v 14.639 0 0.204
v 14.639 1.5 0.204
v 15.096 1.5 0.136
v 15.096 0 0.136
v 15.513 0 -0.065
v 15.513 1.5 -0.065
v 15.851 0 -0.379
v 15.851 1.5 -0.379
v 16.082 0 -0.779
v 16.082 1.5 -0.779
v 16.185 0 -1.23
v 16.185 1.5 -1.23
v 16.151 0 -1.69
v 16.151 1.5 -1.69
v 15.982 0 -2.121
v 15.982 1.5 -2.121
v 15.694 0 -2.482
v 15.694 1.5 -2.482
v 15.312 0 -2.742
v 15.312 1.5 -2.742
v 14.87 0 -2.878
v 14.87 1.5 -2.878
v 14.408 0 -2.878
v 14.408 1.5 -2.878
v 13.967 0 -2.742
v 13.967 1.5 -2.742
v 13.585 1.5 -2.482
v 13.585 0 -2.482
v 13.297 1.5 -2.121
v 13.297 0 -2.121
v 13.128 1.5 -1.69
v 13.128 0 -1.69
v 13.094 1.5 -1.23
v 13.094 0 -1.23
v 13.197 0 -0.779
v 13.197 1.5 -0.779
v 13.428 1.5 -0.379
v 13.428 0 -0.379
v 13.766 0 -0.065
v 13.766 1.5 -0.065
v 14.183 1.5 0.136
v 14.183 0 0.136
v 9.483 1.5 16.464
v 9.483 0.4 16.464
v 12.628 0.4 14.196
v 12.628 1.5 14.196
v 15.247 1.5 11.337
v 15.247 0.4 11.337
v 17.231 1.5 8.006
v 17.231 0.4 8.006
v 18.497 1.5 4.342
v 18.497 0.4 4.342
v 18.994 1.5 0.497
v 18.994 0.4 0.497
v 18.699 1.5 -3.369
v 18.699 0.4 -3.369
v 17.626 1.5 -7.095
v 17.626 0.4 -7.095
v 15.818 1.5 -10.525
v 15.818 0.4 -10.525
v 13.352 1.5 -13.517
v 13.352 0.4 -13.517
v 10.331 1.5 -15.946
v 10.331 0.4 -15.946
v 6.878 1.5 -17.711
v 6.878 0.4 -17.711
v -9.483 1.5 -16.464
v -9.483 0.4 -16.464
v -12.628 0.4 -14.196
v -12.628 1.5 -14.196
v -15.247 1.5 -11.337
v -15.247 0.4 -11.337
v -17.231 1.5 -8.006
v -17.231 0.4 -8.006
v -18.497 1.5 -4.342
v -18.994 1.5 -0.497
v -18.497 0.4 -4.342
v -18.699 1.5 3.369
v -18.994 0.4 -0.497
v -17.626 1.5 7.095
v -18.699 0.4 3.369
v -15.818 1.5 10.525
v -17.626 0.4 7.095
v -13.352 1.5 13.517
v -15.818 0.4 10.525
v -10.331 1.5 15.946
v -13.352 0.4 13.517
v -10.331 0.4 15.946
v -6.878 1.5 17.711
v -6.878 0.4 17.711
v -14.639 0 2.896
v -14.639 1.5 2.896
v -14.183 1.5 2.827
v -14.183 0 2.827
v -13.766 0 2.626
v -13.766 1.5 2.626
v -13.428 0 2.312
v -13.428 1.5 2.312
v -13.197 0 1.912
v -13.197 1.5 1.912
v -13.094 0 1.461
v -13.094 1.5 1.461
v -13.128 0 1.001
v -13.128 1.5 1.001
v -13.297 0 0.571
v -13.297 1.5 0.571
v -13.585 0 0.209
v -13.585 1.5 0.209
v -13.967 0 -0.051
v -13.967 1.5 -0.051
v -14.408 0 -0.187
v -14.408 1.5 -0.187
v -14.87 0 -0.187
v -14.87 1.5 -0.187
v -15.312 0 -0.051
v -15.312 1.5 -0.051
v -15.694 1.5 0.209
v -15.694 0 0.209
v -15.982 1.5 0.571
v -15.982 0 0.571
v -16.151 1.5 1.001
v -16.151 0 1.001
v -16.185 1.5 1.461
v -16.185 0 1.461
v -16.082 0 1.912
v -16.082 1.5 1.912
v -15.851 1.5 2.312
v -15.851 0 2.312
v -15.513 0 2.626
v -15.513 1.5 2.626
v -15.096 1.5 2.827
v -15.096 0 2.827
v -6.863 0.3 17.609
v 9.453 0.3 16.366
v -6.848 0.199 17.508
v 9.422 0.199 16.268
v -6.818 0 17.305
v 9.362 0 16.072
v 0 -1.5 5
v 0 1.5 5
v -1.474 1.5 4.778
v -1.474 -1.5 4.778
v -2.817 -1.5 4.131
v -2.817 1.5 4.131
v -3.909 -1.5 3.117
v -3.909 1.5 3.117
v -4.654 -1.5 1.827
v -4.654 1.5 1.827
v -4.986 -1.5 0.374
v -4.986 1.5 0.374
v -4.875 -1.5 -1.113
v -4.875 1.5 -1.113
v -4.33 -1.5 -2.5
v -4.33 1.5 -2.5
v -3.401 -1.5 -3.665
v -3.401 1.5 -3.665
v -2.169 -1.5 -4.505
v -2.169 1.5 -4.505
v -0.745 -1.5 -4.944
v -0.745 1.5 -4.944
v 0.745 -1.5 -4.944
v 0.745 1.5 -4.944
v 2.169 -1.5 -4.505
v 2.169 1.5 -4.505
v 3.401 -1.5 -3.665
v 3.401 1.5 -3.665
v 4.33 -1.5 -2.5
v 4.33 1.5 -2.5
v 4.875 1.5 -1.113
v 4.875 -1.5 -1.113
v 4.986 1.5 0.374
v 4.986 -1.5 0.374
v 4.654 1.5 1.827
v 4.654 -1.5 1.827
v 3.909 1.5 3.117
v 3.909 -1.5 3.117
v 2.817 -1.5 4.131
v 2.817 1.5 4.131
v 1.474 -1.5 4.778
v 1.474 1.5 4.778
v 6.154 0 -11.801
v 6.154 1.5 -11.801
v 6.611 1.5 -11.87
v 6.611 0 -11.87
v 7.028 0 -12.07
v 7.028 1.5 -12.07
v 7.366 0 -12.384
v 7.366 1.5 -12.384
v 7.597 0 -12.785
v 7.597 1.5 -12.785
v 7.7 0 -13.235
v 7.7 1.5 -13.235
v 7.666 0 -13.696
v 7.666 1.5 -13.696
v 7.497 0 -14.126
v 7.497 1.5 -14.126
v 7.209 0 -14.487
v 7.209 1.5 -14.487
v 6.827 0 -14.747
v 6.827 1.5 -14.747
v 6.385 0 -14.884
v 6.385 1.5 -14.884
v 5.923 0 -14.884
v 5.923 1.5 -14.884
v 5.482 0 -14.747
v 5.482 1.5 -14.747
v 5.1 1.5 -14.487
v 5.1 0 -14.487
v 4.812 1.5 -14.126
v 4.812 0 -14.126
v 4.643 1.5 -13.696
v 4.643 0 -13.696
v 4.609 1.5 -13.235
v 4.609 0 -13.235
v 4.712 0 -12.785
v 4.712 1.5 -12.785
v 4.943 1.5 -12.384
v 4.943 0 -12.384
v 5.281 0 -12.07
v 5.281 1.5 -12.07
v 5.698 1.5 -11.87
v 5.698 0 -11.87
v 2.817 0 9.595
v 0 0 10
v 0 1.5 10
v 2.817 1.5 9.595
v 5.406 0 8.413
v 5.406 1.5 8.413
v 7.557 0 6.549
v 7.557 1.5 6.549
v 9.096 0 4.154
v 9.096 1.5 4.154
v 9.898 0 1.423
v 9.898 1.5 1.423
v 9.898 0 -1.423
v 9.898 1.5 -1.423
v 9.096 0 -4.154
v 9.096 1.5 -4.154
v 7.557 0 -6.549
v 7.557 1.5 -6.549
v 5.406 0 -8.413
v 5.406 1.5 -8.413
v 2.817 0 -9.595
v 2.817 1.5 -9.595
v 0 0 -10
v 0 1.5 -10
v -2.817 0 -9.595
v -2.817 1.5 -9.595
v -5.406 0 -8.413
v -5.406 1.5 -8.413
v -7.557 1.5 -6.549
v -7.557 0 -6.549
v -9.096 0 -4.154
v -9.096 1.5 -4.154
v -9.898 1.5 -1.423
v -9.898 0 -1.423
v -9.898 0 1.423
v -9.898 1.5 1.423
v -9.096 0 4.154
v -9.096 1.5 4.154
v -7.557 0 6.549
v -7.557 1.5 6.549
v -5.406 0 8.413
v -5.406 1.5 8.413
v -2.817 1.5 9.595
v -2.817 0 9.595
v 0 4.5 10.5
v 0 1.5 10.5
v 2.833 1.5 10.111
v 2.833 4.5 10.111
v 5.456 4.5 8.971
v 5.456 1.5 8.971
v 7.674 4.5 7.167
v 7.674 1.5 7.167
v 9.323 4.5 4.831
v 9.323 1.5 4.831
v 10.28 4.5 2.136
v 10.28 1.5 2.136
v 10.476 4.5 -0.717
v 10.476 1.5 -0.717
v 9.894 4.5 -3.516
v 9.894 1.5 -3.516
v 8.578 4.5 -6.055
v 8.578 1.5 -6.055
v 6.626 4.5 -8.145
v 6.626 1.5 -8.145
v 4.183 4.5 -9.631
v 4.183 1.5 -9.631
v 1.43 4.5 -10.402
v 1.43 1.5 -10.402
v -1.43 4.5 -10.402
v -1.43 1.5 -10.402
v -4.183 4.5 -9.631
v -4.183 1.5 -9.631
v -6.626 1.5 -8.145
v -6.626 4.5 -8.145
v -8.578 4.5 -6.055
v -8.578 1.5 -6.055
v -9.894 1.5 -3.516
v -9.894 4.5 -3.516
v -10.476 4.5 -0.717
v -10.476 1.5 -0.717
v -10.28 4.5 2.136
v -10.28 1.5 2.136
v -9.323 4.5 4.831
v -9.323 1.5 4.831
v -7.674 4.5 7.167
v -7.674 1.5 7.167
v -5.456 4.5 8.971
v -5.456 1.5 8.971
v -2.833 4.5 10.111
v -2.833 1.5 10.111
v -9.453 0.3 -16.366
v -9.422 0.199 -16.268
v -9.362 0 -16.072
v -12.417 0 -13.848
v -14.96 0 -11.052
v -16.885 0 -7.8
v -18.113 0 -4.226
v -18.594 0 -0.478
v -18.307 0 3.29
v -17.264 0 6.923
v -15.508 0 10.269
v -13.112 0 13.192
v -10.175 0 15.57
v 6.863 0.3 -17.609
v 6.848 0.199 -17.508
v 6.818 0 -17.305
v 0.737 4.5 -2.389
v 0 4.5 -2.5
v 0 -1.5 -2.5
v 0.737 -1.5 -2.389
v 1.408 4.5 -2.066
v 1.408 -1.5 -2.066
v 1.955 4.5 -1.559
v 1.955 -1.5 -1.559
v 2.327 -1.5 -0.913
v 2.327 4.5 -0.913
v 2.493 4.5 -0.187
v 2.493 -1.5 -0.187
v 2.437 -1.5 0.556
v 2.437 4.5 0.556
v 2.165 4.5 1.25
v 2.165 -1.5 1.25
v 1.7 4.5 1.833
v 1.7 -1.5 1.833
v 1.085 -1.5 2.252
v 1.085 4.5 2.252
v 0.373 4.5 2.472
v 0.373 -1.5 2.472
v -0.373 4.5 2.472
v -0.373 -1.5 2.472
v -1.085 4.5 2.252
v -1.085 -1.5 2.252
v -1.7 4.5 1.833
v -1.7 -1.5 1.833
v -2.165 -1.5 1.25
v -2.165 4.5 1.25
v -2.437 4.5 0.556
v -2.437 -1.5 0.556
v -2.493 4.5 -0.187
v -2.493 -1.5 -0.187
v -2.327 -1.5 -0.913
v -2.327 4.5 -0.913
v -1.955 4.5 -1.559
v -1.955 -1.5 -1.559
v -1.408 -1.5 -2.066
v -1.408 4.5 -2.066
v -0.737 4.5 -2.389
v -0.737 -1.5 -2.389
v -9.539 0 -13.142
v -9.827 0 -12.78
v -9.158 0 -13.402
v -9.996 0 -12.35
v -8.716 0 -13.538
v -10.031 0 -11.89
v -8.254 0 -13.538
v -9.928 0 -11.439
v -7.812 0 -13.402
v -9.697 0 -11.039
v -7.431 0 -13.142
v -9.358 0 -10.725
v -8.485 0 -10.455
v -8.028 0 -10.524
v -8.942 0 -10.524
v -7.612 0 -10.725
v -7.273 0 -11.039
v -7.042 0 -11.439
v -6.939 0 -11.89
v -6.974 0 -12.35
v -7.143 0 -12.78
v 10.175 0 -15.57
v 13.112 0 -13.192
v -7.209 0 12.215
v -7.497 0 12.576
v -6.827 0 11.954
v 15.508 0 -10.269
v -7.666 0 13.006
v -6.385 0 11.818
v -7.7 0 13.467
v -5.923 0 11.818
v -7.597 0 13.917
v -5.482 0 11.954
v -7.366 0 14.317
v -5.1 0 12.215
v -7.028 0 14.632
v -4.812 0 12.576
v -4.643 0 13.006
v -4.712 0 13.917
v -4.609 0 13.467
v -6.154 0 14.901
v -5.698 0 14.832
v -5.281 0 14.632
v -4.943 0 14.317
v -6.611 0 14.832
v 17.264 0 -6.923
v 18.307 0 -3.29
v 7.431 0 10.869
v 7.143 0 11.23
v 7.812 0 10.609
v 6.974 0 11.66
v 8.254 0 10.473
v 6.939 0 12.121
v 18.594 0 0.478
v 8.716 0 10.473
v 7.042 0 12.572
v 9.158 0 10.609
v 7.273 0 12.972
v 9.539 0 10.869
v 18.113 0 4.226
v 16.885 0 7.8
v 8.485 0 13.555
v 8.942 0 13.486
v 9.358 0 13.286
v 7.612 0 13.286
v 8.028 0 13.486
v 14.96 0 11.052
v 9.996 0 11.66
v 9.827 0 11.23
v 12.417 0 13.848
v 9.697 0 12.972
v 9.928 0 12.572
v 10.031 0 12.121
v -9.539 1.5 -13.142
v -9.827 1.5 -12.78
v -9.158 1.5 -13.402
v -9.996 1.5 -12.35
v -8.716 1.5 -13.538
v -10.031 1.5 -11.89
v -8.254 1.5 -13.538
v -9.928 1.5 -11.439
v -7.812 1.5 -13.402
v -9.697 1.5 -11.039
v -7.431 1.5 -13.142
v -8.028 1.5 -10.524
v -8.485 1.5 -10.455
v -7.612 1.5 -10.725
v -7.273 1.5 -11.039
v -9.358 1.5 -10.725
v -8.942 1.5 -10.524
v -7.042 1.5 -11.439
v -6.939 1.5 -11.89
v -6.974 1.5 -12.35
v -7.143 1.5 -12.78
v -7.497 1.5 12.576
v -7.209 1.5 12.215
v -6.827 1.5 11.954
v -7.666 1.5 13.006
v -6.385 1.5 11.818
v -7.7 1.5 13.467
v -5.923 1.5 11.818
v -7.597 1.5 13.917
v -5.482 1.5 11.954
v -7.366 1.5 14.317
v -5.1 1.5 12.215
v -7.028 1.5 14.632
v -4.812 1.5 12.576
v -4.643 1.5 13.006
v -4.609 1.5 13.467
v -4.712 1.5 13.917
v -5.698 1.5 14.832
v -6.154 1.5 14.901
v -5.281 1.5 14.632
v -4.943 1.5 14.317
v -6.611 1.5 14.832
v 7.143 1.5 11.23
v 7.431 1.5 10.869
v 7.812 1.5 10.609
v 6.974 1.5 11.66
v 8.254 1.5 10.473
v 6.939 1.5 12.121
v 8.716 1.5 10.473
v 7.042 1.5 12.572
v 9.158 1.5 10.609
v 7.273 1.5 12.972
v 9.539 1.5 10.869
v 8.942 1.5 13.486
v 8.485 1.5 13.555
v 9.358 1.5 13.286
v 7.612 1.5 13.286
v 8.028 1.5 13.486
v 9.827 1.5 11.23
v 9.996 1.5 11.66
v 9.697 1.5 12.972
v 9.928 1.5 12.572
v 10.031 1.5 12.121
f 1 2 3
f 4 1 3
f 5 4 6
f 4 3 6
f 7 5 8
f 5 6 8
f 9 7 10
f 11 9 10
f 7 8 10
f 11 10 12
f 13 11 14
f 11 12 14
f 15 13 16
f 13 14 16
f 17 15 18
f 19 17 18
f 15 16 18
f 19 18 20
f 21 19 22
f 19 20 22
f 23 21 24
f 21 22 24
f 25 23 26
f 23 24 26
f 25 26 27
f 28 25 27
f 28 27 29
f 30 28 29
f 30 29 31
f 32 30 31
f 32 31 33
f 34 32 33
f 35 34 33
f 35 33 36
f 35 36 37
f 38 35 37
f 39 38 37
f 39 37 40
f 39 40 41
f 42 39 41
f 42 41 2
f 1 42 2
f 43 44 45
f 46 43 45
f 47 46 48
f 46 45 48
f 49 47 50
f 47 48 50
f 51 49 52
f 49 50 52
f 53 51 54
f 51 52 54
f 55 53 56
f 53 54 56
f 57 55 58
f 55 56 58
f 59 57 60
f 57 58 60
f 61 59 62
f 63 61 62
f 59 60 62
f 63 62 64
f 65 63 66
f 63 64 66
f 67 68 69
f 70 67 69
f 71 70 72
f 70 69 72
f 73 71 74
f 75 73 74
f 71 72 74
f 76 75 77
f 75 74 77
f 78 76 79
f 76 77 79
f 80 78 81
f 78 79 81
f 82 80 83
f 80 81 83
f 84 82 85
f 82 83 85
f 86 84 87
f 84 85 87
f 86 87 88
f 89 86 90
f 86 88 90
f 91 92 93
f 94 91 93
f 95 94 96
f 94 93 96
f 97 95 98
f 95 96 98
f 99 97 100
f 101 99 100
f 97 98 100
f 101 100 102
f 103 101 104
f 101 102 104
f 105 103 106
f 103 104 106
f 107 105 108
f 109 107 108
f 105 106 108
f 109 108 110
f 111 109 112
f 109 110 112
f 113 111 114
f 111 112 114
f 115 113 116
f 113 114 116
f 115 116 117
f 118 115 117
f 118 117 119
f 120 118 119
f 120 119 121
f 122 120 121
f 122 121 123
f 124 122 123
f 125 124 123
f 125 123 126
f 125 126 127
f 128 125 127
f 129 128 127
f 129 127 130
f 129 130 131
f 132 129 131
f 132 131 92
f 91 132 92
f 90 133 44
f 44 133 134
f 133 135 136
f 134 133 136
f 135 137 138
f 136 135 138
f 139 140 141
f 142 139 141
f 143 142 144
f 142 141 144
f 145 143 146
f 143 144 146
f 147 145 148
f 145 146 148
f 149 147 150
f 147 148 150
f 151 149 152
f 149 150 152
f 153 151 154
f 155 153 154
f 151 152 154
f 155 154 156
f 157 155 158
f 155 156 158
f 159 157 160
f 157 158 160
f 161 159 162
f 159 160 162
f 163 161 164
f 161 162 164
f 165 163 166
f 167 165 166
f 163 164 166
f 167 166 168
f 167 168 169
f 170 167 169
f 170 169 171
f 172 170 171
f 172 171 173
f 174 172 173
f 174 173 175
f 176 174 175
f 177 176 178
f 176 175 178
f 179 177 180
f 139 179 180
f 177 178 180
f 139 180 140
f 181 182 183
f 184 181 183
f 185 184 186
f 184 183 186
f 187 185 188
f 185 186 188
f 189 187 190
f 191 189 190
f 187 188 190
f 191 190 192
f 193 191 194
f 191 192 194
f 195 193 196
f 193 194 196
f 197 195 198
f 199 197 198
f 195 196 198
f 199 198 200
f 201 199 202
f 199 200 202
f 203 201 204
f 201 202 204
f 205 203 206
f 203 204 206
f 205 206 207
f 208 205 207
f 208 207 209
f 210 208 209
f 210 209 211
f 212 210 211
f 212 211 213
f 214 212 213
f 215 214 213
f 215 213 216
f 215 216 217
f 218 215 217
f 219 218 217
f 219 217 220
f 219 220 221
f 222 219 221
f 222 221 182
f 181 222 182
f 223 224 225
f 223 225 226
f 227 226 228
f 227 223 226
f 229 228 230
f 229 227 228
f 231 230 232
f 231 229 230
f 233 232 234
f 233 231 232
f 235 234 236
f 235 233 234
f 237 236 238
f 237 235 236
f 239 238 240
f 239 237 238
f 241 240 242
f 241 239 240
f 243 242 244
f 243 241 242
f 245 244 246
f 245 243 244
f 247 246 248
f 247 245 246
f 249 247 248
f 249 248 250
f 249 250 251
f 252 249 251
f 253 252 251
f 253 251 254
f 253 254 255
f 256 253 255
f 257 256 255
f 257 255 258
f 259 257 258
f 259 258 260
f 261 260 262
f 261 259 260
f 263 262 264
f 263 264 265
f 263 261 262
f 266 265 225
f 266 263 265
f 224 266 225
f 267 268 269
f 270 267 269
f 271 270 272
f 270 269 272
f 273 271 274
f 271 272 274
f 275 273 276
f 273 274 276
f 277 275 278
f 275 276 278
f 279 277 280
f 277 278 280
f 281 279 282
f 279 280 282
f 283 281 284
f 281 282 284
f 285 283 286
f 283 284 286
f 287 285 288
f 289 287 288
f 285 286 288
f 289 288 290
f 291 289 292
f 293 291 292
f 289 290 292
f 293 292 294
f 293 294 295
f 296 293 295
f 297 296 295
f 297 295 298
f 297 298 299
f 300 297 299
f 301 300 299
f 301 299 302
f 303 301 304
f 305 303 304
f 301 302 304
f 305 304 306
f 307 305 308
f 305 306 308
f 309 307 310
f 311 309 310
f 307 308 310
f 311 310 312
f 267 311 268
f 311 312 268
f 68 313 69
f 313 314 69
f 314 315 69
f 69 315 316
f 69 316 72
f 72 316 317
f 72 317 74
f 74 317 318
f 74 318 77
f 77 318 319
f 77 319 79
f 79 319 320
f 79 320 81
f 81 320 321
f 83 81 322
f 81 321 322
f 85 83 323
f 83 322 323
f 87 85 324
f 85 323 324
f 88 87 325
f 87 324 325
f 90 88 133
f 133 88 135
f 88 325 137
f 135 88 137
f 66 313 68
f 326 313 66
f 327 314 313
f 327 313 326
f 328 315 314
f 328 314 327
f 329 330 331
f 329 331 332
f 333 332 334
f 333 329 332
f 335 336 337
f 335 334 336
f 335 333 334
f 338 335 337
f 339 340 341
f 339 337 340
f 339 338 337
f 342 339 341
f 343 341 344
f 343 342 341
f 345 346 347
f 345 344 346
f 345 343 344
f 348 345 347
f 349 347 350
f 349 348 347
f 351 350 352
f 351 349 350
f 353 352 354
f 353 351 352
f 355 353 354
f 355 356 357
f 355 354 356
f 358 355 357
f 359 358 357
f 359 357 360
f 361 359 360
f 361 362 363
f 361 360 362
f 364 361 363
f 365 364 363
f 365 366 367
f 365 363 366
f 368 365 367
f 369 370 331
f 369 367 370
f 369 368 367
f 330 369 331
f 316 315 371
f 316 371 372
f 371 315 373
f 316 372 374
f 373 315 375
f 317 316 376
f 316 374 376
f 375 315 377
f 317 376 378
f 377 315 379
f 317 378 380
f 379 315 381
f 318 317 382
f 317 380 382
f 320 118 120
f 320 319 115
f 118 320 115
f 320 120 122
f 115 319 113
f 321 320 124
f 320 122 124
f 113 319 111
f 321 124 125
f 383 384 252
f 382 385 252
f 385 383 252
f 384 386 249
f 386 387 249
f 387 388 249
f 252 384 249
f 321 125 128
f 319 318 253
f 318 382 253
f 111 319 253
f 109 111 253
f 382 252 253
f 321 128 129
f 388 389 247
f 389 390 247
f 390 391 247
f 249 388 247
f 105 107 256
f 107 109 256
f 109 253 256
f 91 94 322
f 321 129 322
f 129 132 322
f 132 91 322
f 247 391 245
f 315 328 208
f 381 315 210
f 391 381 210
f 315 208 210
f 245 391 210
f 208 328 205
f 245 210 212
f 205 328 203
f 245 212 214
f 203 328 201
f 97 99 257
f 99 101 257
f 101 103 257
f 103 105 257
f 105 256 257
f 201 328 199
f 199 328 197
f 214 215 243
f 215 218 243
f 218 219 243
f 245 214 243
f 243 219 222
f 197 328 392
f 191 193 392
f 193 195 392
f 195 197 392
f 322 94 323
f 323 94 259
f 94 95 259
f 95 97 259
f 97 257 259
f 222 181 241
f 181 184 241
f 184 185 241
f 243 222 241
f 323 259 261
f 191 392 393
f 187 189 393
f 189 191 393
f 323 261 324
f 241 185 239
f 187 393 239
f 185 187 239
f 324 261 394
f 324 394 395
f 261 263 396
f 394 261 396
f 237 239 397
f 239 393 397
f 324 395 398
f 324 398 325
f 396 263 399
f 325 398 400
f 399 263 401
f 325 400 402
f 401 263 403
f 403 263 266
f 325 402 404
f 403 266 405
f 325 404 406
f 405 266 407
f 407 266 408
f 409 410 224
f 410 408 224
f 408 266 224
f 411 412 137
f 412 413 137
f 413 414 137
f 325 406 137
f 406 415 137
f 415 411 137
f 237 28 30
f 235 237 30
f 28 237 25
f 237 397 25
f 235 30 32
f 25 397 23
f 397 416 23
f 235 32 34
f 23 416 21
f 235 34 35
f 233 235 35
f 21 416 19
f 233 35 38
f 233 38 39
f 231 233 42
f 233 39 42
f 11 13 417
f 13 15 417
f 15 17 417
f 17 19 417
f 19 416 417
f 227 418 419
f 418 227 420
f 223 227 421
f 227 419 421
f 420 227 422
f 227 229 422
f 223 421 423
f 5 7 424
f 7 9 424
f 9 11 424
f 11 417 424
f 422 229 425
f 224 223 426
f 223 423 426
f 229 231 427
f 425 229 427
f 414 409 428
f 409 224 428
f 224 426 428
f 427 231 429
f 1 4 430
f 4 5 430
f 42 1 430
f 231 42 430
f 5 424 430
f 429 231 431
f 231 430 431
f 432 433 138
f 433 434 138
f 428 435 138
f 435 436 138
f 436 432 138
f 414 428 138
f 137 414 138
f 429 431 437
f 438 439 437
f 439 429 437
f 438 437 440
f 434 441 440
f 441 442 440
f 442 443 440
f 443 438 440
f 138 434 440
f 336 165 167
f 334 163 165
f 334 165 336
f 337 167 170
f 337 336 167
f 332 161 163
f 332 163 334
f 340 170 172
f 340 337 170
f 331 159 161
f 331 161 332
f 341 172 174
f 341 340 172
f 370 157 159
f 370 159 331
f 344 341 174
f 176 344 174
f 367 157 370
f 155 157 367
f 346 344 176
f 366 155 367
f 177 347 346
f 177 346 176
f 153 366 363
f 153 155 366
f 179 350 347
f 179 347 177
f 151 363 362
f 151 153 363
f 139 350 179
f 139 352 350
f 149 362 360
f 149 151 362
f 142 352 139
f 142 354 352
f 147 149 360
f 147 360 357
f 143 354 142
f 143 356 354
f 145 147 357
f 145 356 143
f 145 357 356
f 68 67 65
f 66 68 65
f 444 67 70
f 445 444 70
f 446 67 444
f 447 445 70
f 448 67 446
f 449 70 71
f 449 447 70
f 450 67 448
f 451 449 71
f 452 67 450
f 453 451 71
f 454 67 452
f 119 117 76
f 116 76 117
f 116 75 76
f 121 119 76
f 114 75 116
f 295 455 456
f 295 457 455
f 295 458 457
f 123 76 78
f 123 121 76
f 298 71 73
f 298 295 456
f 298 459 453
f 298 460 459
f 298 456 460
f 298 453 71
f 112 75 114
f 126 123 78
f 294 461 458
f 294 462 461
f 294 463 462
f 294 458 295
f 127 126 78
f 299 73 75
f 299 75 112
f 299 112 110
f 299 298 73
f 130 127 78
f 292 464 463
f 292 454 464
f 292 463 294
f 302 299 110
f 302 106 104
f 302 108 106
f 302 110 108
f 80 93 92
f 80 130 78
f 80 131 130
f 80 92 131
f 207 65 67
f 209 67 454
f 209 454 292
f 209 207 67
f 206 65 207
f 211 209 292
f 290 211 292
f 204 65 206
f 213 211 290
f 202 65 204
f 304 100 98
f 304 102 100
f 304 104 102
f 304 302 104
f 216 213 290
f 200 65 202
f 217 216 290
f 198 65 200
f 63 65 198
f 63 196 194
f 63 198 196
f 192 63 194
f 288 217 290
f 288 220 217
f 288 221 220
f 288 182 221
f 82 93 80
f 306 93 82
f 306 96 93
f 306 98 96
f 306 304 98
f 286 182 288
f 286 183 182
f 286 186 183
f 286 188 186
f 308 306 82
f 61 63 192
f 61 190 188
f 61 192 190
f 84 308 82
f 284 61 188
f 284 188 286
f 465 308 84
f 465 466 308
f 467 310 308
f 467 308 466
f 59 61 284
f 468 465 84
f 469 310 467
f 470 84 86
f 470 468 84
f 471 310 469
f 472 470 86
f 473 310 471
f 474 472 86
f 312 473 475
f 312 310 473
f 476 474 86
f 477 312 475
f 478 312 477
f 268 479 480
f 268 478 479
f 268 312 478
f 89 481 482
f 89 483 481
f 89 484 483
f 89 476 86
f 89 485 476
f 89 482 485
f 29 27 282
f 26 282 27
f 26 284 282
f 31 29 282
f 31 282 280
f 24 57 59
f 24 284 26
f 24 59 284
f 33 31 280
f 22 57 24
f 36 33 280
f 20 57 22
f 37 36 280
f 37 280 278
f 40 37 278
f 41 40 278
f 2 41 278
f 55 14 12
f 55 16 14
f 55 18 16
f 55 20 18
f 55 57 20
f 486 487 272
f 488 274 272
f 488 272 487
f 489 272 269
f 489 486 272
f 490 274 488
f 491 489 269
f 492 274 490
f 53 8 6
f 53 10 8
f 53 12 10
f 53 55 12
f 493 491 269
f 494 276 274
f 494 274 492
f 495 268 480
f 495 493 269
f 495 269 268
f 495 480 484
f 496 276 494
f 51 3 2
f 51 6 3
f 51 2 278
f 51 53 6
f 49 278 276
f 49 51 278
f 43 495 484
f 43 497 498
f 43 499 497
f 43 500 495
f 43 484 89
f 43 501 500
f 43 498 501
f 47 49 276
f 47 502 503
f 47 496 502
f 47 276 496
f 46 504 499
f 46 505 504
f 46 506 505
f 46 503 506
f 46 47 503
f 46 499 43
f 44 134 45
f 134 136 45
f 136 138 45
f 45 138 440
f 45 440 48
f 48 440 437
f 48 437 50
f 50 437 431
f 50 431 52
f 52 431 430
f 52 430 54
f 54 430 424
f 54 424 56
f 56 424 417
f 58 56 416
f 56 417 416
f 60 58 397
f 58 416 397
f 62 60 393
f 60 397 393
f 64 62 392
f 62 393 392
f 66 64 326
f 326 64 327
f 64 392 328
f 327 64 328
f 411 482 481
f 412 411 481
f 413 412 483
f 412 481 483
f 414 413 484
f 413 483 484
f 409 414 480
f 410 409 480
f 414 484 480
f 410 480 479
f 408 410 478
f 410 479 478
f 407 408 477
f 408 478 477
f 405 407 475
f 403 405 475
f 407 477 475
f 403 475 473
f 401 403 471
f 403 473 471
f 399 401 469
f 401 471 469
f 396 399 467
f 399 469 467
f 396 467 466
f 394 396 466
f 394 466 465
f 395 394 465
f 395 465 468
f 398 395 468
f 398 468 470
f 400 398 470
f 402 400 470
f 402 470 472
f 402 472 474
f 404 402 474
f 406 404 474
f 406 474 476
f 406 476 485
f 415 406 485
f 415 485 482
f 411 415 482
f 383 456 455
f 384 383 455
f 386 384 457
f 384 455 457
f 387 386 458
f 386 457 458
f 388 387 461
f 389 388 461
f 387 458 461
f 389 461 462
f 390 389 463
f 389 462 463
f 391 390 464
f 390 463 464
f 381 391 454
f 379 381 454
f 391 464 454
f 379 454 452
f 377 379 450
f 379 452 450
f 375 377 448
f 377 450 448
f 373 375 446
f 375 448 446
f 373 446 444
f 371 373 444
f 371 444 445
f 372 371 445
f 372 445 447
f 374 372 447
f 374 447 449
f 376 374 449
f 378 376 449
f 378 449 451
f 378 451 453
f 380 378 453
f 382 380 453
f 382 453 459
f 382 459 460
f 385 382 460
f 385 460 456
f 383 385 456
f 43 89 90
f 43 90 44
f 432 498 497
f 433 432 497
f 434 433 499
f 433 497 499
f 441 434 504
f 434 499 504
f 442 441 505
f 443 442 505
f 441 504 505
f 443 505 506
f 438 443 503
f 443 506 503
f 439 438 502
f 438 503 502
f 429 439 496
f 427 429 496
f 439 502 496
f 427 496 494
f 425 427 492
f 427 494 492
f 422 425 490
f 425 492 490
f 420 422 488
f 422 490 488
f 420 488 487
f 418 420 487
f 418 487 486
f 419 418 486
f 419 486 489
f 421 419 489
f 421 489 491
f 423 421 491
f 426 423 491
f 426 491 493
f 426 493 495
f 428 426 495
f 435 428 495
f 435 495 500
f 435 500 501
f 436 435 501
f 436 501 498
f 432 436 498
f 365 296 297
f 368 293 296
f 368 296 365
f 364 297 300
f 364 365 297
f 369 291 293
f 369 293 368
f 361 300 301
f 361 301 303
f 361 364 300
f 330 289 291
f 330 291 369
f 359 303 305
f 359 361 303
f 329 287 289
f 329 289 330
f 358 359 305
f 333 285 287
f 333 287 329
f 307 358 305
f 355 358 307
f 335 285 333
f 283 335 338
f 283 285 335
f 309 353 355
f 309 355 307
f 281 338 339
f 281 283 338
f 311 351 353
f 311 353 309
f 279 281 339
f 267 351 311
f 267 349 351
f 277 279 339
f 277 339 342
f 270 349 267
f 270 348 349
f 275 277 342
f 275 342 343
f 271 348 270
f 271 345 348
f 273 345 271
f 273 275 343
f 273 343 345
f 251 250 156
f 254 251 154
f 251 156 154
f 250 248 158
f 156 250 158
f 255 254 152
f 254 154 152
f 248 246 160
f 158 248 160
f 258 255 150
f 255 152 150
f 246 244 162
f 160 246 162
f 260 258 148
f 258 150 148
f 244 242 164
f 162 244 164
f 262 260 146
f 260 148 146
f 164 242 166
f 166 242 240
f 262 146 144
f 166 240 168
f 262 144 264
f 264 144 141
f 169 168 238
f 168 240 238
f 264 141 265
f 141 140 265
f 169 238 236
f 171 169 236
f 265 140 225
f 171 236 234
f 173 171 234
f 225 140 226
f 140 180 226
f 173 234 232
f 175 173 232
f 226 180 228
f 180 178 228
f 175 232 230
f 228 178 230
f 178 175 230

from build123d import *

# Parameters (mm, degrees)
SKETCH1_R               = 19
SKETCH1_R_2             = 10
BOSS_EXTRUDE1_DEPTH     = 1.5
SKETCH2_R               = 1.55
CUT_EXTRUDE1_DEPTH      = 27.911893282
SKETCH3_R               = 10.5
BOSS_EXTRUDE2_DEPTH     = 3
CHAMFER2_SIZE           = 0.4
SKETCH4_R               = 5
BOSS_EXTRUDE3_DEPTH     = 3
CUT_EXTRUDE2_DEPTH      = 27.147397772
CUT_EXTRUDE2_DEPTH_BACK = 27.147397772
SKETCH4_3_R             = 2.5


with BuildPart() as part:
    # Sketch1 → Boss-Extrude1 (new body)
    with BuildSketch(Plane(origin=(0, 0, 0), x_dir=(1, 0, 0), z_dir=(0, 1, 0))):
        Circle(SKETCH1_R)
        Circle(SKETCH1_R_2, mode=Mode.SUBTRACT)
    extrude(amount=BOSS_EXTRUDE1_DEPTH)

    # Sketch2 → Cut-Extrude1 (cut, through all)
    with BuildSketch(Plane(origin=(0, 1.5, 0), x_dir=(1, 0, 0), z_dir=(0, 1, 0))):
        with Locations((-8.485, 12.005347771)):
            Circle(SKETCH2_R)
        with Locations((6.154436151, 13.350899437)):
            Circle(SKETCH2_R)
        with Locations((14.639436151, 1.345551666)):
            Circle(SKETCH2_R)
        with Locations((8.485, -12.005347771)):
            Circle(SKETCH2_R)
        with Locations((-6.154436151, -13.350899437)):
            Circle(SKETCH2_R)
        with Locations((-14.639436151, -1.345551666)):
            Circle(SKETCH2_R)
        Polygon((-9.483235294, 16.464150399), (6.878487463, 17.711194489), (6.645170501, 20.772407387), (-9.483235294, 19.543146054), align=None)
        Polygon((9.483235294, -16.464150399), (9.716552256, -19.525363297), (-6.411853538, -20.75462463), (-6.878487463, -17.711194489), align=None)
    extrude(amount=-CUT_EXTRUDE1_DEPTH, mode=Mode.SUBTRACT)

    # Sketch3 → Boss-Extrude2 (add)
    with BuildSketch(Plane(origin=(0, 1.5, 0), x_dir=(1, 0, 0), z_dir=(0, 1, 0))):
        Circle(SKETCH3_R)
    extrude(amount=BOSS_EXTRUDE2_DEPTH)

    # Chamfer2
    chamfer2_edges = [part.edges().sort_by_distance(p)[0] for p in [
        (1.302373916, 0, 17.087672444),
        (-18.945053245, 0, 1.443938211),
        (18.945053245, 0, -1.443938211),
        (-1.302373916, 0, -17.087672444),
    ]]
    chamfer(chamfer2_edges, length=CHAMFER2_SIZE)

    # Sketch4 → Boss-Extrude3 (add)
    with BuildSketch(Plane.XZ.offset(-1.5)):
        Circle(SKETCH4_R)
    extrude(amount=BOSS_EXTRUDE3_DEPTH)

    # Sketch4<3> → Cut-Extrude2 (cut, two sides: drawn at the far end of the back side and taken through both)
    with BuildSketch(Plane.XZ.offset(-1.5).offset(-CUT_EXTRUDE2_DEPTH_BACK)):
        Circle(SKETCH4_3_R)
    extrude(amount=CUT_EXTRUDE2_DEPTH + CUT_EXTRUDE2_DEPTH_BACK, mode=Mode.SUBTRACT)


solid = part.part
